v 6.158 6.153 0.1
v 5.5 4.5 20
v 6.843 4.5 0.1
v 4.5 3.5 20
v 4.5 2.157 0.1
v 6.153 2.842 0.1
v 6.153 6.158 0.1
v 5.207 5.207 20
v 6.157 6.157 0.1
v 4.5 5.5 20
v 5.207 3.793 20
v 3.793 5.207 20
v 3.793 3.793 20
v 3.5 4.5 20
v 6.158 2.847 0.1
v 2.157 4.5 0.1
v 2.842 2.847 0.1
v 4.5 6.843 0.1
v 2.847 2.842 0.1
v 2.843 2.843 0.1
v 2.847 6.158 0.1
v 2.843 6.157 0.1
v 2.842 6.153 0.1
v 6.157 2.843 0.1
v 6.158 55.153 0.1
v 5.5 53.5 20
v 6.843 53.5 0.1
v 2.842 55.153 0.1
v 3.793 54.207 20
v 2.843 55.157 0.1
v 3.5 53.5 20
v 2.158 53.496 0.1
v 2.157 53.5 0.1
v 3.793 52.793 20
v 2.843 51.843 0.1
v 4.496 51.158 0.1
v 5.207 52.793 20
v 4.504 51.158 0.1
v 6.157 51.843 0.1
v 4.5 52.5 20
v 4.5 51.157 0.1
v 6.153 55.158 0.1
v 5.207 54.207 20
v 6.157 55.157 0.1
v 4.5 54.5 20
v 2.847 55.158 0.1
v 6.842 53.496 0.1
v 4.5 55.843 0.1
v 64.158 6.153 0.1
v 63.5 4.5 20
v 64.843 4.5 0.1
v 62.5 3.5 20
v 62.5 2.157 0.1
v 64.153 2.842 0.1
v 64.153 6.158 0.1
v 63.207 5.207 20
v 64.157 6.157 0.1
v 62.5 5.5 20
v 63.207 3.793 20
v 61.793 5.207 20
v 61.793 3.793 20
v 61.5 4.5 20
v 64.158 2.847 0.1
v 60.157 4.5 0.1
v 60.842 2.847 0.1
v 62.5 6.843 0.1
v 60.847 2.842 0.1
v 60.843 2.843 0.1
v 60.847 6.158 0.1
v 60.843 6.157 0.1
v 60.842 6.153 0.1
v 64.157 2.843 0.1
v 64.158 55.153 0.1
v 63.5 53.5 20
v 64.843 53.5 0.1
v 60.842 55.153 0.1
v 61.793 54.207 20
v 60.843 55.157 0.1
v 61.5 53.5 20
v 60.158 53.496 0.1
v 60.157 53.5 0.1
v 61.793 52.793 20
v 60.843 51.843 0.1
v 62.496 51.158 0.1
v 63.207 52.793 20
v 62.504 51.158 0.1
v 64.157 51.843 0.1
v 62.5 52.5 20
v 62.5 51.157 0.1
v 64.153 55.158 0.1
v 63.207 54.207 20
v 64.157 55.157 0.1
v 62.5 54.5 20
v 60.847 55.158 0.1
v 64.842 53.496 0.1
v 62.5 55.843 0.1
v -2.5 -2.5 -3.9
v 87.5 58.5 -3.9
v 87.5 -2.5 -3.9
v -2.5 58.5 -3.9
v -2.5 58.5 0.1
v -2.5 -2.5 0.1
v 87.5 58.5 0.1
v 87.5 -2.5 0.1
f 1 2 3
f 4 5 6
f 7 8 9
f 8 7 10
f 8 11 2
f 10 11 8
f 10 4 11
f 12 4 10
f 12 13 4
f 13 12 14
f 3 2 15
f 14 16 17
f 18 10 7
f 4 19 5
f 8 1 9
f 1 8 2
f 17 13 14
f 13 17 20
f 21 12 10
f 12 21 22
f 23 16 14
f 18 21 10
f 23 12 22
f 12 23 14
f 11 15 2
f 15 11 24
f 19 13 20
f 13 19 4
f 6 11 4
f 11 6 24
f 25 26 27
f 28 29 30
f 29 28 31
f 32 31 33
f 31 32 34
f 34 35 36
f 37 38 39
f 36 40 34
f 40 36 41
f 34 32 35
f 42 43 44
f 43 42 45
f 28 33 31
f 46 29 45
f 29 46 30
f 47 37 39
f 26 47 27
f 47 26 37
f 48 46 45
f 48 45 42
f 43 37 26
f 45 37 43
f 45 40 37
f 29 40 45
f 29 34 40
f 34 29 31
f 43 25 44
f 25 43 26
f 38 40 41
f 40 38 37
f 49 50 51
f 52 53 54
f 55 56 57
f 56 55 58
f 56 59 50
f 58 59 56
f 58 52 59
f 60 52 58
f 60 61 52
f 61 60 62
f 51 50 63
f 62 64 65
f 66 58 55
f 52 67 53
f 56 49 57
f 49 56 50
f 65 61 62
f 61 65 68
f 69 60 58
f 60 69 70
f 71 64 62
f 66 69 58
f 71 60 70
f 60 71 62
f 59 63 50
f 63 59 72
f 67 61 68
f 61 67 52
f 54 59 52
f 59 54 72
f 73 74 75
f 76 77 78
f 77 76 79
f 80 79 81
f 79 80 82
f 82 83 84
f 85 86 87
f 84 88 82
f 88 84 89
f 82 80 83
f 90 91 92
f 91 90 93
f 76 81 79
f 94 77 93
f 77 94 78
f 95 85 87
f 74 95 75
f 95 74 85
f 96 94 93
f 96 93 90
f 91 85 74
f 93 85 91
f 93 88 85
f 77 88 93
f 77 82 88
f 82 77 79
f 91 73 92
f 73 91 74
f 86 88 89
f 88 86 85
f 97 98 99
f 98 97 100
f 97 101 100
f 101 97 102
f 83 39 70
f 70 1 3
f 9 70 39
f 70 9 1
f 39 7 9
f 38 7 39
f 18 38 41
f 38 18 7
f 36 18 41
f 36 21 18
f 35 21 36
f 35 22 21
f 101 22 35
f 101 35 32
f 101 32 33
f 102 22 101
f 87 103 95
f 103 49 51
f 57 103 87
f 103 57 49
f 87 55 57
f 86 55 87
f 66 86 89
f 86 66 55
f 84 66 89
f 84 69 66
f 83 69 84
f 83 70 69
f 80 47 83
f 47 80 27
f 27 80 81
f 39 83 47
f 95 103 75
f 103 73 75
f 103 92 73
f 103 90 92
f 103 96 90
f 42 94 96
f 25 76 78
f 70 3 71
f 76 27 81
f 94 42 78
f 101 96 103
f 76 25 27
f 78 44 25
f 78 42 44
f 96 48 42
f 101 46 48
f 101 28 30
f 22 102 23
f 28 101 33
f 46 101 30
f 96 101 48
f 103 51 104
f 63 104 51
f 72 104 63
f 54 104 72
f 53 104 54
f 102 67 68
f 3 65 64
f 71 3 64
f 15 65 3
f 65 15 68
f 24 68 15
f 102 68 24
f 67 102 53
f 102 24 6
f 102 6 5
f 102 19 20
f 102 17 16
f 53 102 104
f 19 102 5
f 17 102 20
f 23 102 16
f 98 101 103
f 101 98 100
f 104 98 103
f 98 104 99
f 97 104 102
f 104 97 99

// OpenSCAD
BOARD_WIDTH = 85;
BOARD_DEPTH = 56;
BOARD_HEIGHT = 30;
HOLE_DIAMETER = 1.35;
HOLE_DISTANCE_FROM_VERTEX = 2.15;
SPACE_WIDTH_BETWEEN_HOLES = 58;
SPACE_DEPTH_BETWEEN_HOLES = 49;
BIG_OFFSET = 5;

ENCLOSURE_LAYER = 4;
HOLDER_BASE = HOLE_DIAMETER + 1;

module main(){
  board_base_with_holders();
}

module board_base_with_holders(){
  translate([0,0,-ENCLOSURE_LAYER + 0.1])
  board_base();

  holders_pair();

  translate([SPACE_WIDTH_BETWEEN_HOLES, 0, 0])
  holders_pair();  
  
  
}

module holders_pair(){
  translate([HOLE_DISTANCE_FROM_VERTEX + HOLDER_BASE, HOLE_DISTANCE_FROM_VERTEX + HOLDER_BASE, 0]){
    board_holder();
    
    translate([0, SPACE_DEPTH_BETWEEN_HOLES, 0])    
    board_holder();  
  }




}

module board_base(){
  linear_extrude(ENCLOSURE_LAYER)
    translate([-BIG_OFFSET/2, -BIG_OFFSET/2])
    square([BOARD_WIDTH + BIG_OFFSET, BOARD_DEPTH + BIG_OFFSET]);
}

module board_holder(){
  cylinder(r1=HOLDER_BASE, r2=1, h=BOARD_HEIGHT/1.5);
}

main();
